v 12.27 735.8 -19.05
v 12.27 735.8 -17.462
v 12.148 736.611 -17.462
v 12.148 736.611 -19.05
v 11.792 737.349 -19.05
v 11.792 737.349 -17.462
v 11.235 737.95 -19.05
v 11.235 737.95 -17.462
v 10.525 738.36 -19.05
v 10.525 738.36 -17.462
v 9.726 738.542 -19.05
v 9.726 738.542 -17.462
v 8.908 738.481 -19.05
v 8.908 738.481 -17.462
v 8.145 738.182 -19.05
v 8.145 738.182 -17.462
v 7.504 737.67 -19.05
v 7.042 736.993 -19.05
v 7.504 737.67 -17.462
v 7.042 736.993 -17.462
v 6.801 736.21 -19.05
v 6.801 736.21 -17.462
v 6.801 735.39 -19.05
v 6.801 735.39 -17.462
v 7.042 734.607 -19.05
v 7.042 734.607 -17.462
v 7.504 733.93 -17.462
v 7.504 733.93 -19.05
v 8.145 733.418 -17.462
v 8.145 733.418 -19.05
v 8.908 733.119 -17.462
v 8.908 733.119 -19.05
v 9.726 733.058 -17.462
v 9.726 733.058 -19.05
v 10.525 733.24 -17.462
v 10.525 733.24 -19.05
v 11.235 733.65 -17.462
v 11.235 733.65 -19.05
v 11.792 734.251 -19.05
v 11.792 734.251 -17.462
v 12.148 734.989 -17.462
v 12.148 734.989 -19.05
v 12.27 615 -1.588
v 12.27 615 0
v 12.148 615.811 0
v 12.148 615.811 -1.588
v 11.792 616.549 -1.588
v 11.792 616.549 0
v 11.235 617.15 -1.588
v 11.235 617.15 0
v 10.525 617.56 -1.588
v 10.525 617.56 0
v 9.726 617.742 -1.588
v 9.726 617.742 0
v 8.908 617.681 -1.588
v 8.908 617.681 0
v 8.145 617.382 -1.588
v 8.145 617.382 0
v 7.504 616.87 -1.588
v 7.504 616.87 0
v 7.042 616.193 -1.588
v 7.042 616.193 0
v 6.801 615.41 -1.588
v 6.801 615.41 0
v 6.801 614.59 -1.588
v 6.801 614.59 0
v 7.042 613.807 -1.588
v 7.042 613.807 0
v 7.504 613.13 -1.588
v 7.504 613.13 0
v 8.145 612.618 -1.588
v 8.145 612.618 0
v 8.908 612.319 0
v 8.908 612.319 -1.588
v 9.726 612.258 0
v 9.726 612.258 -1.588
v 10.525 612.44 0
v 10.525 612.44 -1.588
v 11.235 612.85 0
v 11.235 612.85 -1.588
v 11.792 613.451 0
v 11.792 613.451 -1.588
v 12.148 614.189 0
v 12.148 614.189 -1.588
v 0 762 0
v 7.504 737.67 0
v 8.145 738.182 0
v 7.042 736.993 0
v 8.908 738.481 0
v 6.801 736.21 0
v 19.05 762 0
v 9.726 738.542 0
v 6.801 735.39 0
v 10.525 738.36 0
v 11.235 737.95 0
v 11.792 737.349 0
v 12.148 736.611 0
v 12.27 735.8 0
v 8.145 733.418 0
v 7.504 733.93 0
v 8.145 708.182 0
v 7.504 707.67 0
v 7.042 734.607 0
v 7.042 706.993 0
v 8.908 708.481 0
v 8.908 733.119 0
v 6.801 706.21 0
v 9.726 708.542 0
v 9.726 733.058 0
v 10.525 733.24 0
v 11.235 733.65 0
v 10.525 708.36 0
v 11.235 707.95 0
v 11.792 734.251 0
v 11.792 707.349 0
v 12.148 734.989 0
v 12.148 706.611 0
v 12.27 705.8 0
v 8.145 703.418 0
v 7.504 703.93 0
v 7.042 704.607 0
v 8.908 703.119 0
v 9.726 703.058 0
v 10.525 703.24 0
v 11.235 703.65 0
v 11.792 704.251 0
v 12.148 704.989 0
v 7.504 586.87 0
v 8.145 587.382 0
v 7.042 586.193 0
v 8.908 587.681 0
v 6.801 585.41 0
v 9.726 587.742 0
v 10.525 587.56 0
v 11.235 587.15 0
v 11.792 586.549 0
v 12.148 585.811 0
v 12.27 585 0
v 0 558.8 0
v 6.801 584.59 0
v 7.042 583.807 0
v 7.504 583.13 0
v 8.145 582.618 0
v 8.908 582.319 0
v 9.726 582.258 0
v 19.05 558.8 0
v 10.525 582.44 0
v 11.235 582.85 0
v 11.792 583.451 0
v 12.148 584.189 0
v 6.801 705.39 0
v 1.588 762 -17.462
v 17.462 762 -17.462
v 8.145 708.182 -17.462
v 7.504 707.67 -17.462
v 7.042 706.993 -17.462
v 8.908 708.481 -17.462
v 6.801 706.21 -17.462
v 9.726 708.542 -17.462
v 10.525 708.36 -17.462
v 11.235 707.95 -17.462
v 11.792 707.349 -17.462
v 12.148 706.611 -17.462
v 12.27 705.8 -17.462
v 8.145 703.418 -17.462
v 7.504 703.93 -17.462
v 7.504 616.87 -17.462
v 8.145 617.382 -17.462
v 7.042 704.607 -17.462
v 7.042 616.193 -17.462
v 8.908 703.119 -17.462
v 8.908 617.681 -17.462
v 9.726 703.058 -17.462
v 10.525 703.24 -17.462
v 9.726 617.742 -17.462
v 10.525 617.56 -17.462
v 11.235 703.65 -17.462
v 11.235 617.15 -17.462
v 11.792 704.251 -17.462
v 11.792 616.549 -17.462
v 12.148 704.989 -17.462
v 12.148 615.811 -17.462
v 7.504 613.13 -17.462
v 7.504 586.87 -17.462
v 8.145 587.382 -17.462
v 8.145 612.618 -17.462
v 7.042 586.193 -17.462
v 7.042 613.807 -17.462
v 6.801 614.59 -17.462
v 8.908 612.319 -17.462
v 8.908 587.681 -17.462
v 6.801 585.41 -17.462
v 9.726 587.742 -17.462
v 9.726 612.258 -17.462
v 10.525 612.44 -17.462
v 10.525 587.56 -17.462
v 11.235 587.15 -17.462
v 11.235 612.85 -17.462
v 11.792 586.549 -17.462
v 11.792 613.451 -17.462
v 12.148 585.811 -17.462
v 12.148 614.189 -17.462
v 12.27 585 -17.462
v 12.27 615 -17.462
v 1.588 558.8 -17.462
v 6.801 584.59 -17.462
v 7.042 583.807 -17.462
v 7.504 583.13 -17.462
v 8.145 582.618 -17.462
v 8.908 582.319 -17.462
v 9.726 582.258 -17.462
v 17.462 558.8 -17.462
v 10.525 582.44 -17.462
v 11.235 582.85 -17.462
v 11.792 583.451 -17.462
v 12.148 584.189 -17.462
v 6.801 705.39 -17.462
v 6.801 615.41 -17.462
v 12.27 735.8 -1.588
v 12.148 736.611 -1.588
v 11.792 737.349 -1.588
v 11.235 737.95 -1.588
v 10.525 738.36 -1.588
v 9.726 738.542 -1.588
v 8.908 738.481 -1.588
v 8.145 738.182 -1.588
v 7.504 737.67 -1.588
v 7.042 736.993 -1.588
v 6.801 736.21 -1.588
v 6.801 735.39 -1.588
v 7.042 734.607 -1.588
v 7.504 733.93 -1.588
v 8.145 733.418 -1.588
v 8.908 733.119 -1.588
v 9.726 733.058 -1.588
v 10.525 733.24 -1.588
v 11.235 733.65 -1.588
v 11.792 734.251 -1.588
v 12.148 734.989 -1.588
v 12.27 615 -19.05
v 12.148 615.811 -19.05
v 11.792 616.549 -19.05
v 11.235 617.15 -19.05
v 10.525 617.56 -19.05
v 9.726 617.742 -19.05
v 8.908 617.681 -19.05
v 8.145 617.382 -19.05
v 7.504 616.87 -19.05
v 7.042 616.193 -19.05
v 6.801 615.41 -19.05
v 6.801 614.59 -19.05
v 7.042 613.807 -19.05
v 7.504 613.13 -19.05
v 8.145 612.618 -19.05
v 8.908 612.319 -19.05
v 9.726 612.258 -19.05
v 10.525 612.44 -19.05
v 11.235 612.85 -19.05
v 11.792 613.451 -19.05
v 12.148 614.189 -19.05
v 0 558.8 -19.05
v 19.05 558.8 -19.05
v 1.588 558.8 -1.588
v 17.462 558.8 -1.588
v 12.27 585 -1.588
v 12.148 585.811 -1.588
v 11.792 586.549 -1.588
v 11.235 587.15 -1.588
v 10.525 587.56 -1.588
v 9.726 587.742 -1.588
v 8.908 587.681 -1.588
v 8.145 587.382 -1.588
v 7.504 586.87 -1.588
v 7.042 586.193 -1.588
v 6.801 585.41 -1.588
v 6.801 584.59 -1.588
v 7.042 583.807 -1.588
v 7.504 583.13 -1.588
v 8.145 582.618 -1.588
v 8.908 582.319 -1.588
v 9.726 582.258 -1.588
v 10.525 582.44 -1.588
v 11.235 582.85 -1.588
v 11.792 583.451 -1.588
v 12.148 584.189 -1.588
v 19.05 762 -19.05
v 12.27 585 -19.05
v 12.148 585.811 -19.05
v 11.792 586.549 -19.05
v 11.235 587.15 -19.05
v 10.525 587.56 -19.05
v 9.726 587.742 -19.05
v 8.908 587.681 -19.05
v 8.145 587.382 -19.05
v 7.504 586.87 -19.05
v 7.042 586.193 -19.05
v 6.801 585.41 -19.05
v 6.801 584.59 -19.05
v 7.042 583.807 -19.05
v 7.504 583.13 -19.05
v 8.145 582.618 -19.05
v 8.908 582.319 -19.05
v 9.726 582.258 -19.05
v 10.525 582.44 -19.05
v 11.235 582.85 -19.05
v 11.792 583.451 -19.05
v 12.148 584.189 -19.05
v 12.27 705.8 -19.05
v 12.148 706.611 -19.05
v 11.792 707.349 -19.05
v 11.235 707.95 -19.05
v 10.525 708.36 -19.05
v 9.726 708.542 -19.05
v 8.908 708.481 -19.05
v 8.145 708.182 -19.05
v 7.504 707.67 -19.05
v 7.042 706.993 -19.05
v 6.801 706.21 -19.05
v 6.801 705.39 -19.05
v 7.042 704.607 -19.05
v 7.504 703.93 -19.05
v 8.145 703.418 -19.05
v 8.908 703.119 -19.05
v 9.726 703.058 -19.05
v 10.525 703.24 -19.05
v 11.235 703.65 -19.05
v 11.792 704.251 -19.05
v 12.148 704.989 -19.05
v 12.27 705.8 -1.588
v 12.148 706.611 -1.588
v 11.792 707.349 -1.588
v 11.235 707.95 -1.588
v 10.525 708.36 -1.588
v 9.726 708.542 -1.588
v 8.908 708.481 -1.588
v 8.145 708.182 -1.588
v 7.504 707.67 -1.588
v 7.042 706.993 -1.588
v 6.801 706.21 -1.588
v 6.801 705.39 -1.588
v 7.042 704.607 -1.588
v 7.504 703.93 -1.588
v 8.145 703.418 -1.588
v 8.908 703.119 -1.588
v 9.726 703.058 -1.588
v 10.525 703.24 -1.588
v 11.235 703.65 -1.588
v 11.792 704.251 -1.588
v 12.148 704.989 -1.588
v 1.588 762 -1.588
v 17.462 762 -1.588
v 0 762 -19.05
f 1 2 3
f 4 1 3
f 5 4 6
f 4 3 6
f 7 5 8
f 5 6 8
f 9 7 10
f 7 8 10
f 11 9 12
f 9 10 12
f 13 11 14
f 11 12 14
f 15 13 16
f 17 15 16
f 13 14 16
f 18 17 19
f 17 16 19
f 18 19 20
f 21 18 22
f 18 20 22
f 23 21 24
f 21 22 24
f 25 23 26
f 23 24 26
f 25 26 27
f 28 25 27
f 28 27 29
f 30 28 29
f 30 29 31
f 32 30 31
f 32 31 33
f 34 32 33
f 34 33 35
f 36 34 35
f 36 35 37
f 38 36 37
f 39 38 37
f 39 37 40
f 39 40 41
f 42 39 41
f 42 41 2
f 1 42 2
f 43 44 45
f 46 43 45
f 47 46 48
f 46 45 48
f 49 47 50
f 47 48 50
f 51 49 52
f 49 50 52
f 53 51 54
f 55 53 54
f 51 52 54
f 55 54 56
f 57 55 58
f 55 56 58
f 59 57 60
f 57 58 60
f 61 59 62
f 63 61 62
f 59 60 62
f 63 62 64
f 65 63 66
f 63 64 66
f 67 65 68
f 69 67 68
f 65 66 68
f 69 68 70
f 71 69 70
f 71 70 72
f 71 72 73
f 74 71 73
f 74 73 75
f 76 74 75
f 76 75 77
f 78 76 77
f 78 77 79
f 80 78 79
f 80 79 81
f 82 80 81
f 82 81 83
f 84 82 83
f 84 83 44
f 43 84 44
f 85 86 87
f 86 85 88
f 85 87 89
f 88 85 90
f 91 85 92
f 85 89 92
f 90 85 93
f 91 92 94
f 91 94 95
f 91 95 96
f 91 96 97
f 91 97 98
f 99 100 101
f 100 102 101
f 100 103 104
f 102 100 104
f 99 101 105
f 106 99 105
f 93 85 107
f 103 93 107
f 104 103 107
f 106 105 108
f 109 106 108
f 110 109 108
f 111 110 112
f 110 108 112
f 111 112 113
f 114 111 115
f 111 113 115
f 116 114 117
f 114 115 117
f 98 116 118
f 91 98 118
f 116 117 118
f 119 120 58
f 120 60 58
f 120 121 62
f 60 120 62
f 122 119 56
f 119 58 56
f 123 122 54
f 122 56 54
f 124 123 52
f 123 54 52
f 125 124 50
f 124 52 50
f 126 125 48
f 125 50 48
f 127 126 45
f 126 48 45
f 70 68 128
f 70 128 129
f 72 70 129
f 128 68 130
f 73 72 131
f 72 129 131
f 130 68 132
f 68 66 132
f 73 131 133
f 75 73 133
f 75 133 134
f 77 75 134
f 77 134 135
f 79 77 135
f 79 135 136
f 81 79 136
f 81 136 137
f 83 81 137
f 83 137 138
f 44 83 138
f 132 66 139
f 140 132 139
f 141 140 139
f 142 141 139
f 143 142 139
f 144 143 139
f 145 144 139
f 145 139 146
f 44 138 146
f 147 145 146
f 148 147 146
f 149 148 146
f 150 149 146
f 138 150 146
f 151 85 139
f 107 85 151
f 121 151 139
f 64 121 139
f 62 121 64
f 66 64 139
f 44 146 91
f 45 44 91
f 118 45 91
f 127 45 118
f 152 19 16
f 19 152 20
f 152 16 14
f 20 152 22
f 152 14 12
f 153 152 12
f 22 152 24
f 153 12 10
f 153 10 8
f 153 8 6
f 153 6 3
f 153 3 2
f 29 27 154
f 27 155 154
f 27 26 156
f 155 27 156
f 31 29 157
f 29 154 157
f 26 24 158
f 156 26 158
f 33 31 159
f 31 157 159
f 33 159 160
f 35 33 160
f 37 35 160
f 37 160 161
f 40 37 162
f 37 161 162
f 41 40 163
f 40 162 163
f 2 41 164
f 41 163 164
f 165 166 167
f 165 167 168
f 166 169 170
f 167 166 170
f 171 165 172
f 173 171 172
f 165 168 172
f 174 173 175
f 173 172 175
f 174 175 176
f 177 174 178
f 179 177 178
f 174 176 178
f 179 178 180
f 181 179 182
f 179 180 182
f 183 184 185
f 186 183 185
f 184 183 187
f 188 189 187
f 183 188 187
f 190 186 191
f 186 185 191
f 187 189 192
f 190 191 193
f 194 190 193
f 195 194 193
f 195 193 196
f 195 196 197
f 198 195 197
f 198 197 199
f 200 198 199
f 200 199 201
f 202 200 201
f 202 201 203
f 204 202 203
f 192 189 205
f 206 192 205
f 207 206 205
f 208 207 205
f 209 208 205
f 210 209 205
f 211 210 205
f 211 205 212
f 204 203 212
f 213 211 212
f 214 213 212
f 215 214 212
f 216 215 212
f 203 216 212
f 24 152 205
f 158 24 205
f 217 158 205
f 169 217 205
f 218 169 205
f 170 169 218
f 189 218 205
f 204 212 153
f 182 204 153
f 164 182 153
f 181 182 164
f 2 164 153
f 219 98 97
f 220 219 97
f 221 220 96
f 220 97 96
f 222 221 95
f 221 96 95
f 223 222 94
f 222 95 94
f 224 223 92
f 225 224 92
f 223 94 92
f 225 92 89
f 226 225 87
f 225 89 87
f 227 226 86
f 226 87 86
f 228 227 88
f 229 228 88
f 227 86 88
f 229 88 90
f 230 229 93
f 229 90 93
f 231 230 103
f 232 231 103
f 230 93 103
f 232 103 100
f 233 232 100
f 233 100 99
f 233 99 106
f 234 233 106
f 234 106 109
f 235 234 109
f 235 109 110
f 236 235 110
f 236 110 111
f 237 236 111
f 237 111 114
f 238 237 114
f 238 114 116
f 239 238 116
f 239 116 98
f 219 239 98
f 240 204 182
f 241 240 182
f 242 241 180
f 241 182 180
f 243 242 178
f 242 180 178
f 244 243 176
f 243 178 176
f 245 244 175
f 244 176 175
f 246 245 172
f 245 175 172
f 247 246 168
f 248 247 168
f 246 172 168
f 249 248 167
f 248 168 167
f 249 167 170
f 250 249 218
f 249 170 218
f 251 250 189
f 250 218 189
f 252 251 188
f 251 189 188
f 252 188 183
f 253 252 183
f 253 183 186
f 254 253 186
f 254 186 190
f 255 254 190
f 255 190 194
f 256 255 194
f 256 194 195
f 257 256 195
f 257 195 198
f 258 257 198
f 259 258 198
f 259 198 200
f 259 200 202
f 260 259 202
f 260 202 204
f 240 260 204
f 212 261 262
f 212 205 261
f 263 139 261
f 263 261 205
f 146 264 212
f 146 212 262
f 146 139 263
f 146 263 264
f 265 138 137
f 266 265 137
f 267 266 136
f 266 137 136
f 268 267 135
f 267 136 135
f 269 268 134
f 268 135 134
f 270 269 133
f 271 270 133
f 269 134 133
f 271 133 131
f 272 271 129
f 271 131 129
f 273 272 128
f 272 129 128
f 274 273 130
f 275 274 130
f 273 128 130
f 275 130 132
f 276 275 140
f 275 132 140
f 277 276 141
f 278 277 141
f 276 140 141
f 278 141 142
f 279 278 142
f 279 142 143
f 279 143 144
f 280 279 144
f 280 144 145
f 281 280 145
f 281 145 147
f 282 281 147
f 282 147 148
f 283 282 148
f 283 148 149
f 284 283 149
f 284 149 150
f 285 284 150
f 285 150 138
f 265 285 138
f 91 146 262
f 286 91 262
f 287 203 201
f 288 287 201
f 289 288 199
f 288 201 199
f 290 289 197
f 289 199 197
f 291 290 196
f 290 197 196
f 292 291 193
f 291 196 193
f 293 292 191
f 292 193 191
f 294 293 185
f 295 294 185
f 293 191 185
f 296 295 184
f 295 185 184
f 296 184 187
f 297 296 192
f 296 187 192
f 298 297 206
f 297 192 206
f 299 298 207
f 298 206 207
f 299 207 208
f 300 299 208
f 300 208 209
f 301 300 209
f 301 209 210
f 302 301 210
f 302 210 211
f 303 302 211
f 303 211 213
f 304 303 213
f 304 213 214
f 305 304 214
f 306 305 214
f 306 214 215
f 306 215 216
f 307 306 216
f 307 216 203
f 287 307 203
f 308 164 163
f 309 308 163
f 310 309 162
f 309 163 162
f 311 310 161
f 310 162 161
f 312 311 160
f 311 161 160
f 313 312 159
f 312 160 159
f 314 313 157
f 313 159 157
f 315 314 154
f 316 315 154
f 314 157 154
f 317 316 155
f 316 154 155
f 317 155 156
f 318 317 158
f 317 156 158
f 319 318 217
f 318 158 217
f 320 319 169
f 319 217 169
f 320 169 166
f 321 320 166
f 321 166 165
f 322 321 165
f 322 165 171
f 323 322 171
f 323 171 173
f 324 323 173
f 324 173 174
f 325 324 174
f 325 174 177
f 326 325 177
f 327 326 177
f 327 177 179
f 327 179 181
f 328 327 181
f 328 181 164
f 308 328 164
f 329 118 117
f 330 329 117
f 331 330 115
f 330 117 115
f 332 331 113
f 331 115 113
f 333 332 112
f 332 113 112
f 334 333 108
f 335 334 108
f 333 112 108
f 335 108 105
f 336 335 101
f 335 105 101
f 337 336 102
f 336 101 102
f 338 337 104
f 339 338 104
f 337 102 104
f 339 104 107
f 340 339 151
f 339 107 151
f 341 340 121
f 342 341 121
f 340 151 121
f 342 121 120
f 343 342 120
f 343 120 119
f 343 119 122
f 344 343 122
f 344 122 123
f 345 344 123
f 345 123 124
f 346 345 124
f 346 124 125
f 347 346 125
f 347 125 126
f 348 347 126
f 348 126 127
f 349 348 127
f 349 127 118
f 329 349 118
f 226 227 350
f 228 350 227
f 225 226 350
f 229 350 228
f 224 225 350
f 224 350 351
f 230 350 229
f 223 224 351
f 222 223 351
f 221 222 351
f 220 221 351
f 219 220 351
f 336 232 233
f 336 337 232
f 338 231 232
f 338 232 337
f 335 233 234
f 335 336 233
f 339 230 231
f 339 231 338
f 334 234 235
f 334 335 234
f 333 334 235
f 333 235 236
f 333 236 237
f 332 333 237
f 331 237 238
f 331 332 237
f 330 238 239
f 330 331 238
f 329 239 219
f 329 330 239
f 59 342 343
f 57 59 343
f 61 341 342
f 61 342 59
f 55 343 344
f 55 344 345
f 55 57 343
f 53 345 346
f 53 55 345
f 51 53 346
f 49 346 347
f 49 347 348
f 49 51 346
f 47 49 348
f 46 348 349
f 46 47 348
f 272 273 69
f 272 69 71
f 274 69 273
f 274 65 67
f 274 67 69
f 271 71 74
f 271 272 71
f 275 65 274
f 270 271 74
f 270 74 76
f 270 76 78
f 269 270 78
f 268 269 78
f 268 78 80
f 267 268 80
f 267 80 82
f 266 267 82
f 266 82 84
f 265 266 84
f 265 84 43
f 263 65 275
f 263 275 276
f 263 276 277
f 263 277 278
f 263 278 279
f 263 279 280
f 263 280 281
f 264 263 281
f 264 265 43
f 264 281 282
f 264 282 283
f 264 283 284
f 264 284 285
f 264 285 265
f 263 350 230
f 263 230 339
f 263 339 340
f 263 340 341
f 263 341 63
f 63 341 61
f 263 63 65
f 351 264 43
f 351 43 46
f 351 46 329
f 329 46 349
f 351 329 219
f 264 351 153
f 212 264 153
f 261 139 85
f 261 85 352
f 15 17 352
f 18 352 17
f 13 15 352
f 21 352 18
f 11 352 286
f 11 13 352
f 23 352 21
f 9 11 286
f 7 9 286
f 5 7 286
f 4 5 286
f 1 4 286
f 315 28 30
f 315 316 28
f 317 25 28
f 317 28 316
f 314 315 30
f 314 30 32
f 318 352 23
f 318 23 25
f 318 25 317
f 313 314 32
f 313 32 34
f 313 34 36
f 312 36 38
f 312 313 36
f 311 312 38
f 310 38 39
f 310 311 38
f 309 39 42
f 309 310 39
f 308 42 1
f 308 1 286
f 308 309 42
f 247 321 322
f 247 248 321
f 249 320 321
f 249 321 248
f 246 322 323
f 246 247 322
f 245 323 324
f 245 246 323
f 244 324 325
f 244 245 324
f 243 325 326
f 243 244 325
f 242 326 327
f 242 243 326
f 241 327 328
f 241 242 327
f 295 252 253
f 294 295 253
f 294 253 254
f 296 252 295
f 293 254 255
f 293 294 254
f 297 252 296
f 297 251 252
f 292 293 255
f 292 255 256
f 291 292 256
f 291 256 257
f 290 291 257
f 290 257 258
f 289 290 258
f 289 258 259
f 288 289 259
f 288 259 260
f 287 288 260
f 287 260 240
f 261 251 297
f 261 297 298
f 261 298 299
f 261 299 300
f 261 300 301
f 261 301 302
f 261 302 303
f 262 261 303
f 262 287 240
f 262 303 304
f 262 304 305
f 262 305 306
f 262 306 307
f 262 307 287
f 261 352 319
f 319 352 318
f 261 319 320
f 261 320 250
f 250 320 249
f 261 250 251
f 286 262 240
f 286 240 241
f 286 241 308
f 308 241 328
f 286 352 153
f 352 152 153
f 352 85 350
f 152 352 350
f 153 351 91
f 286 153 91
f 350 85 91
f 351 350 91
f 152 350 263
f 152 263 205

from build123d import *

# Parameters (mm, degrees)
SKETCH1_W           = 19.05
SKETCH1_H           = 19.05
SKETCH1_W_2         = 15.875
SKETCH1_H_2         = 15.875
BOSS_EXTRUDE1_DEPTH = 914.4
SKETCH2_R           = 2.75
CUT_EXTRUDE1_DEPTH  = 20.05
CUT_EXTRUDE2_REACH  = 21.05
SKETCH3_R           = 4.255
SKETCH4_OUTSIDE_W   = 204.01
SKETCH4_OUTSIDE_H   = 1099.36
SKETCH4_OUTSIDE_W_2 = 19.05
SKETCH4_OUTSIDE_H_2 = 203.2
CUT_EXTRUDE3_DEPTH  = 20.05
SKETCH5_R           = 2.75
CUT_EXTRUDE4_DEPTH  = 20.05


with BuildPart() as part:
    # Sketch1 → Boss-Extrude1 (new body)
    with BuildSketch(Plane(origin=(0, 0, 0), x_dir=(1, 0, 0), z_dir=(0, 1, 0))):
        with Locations((9.525, 9.525)):
            Rectangle(SKETCH1_W, SKETCH1_H)
        with Locations((9.525, 9.525)):
            Rectangle(SKETCH1_W_2, SKETCH1_H_2, mode=Mode.SUBTRACT)
    extrude(amount=BOSS_EXTRUDE1_DEPTH)

    # Sketch2 → Cut-Extrude1 (cut, through all)
    with BuildSketch(Plane.XY):
        with Locations((9.525, 906.4)):
            Circle(SKETCH2_R)
        with Locations((9.525, 891.4)):
            Circle(SKETCH2_R)
    extrude(amount=-CUT_EXTRUDE1_DEPTH, mode=Mode.SUBTRACT)

    # Sketch3 → Cut-Extrude2 (cut, up to next)
    with BuildSketch(Plane(origin=(0, 0, -19.05), x_dir=(-1, 0, 0), z_dir=(0, 0, -1)), mode=Mode.PRIVATE) as cut_extrude2_sk1:
        with Locations((-9.525, 906.4)):
            Circle(SKETCH3_R)
    cut_extrude2_tool1 = extrude(cut_extrude2_sk1.sketch, amount=-CUT_EXTRUDE2_REACH, mode=Mode.PRIVATE) & part.part
    add(cut_extrude2_tool1.solids().sort_by_distance((9.525, 906.4, -19.05))[0], mode=Mode.SUBTRACT)
    # Sketch3 → Cut-Extrude2 (cut, up to next)
    with BuildSketch(Plane(origin=(0, 0, -19.05), x_dir=(-1, 0, 0), z_dir=(0, 0, -1)), mode=Mode.PRIVATE) as cut_extrude2_sk2:
        with Locations((-9.525, 891.4)):
            Circle(SKETCH3_R)
    cut_extrude2_tool2 = extrude(cut_extrude2_sk2.sketch, amount=-CUT_EXTRUDE2_REACH, mode=Mode.PRIVATE) & part.part
    add(cut_extrude2_tool2.solids().sort_by_distance((9.525, 891.4, -19.05))[0], mode=Mode.SUBTRACT)

    # Sketch4 outside → Cut-Extrude3 (cut, through all)
    with BuildSketch(Plane.XY):
        with Locations((9.525, 457.2)):
            Rectangle(SKETCH4_OUTSIDE_W, SKETCH4_OUTSIDE_H)
        with Locations((9.525, 660.4)):
            Rectangle(SKETCH4_OUTSIDE_W_2, SKETCH4_OUTSIDE_H_2, mode=Mode.SUBTRACT)
    extrude(amount=-CUT_EXTRUDE3_DEPTH, mode=Mode.SUBTRACT)

    # Sketch5 → Cut-Extrude4 (cut, through all)
    with BuildSketch(Plane.XY):
        with Locations((9.52, 735.8)):
            Circle(SKETCH5_R)
        with Locations((9.52, 705.8)):
            Circle(SKETCH5_R)
        with Locations((9.52, 585)):
            Circle(SKETCH5_R)
        with Locations((9.52, 615)):
            Circle(SKETCH5_R)
    extrude(amount=-CUT_EXTRUDE4_DEPTH, mode=Mode.SUBTRACT)


solid = part.part
